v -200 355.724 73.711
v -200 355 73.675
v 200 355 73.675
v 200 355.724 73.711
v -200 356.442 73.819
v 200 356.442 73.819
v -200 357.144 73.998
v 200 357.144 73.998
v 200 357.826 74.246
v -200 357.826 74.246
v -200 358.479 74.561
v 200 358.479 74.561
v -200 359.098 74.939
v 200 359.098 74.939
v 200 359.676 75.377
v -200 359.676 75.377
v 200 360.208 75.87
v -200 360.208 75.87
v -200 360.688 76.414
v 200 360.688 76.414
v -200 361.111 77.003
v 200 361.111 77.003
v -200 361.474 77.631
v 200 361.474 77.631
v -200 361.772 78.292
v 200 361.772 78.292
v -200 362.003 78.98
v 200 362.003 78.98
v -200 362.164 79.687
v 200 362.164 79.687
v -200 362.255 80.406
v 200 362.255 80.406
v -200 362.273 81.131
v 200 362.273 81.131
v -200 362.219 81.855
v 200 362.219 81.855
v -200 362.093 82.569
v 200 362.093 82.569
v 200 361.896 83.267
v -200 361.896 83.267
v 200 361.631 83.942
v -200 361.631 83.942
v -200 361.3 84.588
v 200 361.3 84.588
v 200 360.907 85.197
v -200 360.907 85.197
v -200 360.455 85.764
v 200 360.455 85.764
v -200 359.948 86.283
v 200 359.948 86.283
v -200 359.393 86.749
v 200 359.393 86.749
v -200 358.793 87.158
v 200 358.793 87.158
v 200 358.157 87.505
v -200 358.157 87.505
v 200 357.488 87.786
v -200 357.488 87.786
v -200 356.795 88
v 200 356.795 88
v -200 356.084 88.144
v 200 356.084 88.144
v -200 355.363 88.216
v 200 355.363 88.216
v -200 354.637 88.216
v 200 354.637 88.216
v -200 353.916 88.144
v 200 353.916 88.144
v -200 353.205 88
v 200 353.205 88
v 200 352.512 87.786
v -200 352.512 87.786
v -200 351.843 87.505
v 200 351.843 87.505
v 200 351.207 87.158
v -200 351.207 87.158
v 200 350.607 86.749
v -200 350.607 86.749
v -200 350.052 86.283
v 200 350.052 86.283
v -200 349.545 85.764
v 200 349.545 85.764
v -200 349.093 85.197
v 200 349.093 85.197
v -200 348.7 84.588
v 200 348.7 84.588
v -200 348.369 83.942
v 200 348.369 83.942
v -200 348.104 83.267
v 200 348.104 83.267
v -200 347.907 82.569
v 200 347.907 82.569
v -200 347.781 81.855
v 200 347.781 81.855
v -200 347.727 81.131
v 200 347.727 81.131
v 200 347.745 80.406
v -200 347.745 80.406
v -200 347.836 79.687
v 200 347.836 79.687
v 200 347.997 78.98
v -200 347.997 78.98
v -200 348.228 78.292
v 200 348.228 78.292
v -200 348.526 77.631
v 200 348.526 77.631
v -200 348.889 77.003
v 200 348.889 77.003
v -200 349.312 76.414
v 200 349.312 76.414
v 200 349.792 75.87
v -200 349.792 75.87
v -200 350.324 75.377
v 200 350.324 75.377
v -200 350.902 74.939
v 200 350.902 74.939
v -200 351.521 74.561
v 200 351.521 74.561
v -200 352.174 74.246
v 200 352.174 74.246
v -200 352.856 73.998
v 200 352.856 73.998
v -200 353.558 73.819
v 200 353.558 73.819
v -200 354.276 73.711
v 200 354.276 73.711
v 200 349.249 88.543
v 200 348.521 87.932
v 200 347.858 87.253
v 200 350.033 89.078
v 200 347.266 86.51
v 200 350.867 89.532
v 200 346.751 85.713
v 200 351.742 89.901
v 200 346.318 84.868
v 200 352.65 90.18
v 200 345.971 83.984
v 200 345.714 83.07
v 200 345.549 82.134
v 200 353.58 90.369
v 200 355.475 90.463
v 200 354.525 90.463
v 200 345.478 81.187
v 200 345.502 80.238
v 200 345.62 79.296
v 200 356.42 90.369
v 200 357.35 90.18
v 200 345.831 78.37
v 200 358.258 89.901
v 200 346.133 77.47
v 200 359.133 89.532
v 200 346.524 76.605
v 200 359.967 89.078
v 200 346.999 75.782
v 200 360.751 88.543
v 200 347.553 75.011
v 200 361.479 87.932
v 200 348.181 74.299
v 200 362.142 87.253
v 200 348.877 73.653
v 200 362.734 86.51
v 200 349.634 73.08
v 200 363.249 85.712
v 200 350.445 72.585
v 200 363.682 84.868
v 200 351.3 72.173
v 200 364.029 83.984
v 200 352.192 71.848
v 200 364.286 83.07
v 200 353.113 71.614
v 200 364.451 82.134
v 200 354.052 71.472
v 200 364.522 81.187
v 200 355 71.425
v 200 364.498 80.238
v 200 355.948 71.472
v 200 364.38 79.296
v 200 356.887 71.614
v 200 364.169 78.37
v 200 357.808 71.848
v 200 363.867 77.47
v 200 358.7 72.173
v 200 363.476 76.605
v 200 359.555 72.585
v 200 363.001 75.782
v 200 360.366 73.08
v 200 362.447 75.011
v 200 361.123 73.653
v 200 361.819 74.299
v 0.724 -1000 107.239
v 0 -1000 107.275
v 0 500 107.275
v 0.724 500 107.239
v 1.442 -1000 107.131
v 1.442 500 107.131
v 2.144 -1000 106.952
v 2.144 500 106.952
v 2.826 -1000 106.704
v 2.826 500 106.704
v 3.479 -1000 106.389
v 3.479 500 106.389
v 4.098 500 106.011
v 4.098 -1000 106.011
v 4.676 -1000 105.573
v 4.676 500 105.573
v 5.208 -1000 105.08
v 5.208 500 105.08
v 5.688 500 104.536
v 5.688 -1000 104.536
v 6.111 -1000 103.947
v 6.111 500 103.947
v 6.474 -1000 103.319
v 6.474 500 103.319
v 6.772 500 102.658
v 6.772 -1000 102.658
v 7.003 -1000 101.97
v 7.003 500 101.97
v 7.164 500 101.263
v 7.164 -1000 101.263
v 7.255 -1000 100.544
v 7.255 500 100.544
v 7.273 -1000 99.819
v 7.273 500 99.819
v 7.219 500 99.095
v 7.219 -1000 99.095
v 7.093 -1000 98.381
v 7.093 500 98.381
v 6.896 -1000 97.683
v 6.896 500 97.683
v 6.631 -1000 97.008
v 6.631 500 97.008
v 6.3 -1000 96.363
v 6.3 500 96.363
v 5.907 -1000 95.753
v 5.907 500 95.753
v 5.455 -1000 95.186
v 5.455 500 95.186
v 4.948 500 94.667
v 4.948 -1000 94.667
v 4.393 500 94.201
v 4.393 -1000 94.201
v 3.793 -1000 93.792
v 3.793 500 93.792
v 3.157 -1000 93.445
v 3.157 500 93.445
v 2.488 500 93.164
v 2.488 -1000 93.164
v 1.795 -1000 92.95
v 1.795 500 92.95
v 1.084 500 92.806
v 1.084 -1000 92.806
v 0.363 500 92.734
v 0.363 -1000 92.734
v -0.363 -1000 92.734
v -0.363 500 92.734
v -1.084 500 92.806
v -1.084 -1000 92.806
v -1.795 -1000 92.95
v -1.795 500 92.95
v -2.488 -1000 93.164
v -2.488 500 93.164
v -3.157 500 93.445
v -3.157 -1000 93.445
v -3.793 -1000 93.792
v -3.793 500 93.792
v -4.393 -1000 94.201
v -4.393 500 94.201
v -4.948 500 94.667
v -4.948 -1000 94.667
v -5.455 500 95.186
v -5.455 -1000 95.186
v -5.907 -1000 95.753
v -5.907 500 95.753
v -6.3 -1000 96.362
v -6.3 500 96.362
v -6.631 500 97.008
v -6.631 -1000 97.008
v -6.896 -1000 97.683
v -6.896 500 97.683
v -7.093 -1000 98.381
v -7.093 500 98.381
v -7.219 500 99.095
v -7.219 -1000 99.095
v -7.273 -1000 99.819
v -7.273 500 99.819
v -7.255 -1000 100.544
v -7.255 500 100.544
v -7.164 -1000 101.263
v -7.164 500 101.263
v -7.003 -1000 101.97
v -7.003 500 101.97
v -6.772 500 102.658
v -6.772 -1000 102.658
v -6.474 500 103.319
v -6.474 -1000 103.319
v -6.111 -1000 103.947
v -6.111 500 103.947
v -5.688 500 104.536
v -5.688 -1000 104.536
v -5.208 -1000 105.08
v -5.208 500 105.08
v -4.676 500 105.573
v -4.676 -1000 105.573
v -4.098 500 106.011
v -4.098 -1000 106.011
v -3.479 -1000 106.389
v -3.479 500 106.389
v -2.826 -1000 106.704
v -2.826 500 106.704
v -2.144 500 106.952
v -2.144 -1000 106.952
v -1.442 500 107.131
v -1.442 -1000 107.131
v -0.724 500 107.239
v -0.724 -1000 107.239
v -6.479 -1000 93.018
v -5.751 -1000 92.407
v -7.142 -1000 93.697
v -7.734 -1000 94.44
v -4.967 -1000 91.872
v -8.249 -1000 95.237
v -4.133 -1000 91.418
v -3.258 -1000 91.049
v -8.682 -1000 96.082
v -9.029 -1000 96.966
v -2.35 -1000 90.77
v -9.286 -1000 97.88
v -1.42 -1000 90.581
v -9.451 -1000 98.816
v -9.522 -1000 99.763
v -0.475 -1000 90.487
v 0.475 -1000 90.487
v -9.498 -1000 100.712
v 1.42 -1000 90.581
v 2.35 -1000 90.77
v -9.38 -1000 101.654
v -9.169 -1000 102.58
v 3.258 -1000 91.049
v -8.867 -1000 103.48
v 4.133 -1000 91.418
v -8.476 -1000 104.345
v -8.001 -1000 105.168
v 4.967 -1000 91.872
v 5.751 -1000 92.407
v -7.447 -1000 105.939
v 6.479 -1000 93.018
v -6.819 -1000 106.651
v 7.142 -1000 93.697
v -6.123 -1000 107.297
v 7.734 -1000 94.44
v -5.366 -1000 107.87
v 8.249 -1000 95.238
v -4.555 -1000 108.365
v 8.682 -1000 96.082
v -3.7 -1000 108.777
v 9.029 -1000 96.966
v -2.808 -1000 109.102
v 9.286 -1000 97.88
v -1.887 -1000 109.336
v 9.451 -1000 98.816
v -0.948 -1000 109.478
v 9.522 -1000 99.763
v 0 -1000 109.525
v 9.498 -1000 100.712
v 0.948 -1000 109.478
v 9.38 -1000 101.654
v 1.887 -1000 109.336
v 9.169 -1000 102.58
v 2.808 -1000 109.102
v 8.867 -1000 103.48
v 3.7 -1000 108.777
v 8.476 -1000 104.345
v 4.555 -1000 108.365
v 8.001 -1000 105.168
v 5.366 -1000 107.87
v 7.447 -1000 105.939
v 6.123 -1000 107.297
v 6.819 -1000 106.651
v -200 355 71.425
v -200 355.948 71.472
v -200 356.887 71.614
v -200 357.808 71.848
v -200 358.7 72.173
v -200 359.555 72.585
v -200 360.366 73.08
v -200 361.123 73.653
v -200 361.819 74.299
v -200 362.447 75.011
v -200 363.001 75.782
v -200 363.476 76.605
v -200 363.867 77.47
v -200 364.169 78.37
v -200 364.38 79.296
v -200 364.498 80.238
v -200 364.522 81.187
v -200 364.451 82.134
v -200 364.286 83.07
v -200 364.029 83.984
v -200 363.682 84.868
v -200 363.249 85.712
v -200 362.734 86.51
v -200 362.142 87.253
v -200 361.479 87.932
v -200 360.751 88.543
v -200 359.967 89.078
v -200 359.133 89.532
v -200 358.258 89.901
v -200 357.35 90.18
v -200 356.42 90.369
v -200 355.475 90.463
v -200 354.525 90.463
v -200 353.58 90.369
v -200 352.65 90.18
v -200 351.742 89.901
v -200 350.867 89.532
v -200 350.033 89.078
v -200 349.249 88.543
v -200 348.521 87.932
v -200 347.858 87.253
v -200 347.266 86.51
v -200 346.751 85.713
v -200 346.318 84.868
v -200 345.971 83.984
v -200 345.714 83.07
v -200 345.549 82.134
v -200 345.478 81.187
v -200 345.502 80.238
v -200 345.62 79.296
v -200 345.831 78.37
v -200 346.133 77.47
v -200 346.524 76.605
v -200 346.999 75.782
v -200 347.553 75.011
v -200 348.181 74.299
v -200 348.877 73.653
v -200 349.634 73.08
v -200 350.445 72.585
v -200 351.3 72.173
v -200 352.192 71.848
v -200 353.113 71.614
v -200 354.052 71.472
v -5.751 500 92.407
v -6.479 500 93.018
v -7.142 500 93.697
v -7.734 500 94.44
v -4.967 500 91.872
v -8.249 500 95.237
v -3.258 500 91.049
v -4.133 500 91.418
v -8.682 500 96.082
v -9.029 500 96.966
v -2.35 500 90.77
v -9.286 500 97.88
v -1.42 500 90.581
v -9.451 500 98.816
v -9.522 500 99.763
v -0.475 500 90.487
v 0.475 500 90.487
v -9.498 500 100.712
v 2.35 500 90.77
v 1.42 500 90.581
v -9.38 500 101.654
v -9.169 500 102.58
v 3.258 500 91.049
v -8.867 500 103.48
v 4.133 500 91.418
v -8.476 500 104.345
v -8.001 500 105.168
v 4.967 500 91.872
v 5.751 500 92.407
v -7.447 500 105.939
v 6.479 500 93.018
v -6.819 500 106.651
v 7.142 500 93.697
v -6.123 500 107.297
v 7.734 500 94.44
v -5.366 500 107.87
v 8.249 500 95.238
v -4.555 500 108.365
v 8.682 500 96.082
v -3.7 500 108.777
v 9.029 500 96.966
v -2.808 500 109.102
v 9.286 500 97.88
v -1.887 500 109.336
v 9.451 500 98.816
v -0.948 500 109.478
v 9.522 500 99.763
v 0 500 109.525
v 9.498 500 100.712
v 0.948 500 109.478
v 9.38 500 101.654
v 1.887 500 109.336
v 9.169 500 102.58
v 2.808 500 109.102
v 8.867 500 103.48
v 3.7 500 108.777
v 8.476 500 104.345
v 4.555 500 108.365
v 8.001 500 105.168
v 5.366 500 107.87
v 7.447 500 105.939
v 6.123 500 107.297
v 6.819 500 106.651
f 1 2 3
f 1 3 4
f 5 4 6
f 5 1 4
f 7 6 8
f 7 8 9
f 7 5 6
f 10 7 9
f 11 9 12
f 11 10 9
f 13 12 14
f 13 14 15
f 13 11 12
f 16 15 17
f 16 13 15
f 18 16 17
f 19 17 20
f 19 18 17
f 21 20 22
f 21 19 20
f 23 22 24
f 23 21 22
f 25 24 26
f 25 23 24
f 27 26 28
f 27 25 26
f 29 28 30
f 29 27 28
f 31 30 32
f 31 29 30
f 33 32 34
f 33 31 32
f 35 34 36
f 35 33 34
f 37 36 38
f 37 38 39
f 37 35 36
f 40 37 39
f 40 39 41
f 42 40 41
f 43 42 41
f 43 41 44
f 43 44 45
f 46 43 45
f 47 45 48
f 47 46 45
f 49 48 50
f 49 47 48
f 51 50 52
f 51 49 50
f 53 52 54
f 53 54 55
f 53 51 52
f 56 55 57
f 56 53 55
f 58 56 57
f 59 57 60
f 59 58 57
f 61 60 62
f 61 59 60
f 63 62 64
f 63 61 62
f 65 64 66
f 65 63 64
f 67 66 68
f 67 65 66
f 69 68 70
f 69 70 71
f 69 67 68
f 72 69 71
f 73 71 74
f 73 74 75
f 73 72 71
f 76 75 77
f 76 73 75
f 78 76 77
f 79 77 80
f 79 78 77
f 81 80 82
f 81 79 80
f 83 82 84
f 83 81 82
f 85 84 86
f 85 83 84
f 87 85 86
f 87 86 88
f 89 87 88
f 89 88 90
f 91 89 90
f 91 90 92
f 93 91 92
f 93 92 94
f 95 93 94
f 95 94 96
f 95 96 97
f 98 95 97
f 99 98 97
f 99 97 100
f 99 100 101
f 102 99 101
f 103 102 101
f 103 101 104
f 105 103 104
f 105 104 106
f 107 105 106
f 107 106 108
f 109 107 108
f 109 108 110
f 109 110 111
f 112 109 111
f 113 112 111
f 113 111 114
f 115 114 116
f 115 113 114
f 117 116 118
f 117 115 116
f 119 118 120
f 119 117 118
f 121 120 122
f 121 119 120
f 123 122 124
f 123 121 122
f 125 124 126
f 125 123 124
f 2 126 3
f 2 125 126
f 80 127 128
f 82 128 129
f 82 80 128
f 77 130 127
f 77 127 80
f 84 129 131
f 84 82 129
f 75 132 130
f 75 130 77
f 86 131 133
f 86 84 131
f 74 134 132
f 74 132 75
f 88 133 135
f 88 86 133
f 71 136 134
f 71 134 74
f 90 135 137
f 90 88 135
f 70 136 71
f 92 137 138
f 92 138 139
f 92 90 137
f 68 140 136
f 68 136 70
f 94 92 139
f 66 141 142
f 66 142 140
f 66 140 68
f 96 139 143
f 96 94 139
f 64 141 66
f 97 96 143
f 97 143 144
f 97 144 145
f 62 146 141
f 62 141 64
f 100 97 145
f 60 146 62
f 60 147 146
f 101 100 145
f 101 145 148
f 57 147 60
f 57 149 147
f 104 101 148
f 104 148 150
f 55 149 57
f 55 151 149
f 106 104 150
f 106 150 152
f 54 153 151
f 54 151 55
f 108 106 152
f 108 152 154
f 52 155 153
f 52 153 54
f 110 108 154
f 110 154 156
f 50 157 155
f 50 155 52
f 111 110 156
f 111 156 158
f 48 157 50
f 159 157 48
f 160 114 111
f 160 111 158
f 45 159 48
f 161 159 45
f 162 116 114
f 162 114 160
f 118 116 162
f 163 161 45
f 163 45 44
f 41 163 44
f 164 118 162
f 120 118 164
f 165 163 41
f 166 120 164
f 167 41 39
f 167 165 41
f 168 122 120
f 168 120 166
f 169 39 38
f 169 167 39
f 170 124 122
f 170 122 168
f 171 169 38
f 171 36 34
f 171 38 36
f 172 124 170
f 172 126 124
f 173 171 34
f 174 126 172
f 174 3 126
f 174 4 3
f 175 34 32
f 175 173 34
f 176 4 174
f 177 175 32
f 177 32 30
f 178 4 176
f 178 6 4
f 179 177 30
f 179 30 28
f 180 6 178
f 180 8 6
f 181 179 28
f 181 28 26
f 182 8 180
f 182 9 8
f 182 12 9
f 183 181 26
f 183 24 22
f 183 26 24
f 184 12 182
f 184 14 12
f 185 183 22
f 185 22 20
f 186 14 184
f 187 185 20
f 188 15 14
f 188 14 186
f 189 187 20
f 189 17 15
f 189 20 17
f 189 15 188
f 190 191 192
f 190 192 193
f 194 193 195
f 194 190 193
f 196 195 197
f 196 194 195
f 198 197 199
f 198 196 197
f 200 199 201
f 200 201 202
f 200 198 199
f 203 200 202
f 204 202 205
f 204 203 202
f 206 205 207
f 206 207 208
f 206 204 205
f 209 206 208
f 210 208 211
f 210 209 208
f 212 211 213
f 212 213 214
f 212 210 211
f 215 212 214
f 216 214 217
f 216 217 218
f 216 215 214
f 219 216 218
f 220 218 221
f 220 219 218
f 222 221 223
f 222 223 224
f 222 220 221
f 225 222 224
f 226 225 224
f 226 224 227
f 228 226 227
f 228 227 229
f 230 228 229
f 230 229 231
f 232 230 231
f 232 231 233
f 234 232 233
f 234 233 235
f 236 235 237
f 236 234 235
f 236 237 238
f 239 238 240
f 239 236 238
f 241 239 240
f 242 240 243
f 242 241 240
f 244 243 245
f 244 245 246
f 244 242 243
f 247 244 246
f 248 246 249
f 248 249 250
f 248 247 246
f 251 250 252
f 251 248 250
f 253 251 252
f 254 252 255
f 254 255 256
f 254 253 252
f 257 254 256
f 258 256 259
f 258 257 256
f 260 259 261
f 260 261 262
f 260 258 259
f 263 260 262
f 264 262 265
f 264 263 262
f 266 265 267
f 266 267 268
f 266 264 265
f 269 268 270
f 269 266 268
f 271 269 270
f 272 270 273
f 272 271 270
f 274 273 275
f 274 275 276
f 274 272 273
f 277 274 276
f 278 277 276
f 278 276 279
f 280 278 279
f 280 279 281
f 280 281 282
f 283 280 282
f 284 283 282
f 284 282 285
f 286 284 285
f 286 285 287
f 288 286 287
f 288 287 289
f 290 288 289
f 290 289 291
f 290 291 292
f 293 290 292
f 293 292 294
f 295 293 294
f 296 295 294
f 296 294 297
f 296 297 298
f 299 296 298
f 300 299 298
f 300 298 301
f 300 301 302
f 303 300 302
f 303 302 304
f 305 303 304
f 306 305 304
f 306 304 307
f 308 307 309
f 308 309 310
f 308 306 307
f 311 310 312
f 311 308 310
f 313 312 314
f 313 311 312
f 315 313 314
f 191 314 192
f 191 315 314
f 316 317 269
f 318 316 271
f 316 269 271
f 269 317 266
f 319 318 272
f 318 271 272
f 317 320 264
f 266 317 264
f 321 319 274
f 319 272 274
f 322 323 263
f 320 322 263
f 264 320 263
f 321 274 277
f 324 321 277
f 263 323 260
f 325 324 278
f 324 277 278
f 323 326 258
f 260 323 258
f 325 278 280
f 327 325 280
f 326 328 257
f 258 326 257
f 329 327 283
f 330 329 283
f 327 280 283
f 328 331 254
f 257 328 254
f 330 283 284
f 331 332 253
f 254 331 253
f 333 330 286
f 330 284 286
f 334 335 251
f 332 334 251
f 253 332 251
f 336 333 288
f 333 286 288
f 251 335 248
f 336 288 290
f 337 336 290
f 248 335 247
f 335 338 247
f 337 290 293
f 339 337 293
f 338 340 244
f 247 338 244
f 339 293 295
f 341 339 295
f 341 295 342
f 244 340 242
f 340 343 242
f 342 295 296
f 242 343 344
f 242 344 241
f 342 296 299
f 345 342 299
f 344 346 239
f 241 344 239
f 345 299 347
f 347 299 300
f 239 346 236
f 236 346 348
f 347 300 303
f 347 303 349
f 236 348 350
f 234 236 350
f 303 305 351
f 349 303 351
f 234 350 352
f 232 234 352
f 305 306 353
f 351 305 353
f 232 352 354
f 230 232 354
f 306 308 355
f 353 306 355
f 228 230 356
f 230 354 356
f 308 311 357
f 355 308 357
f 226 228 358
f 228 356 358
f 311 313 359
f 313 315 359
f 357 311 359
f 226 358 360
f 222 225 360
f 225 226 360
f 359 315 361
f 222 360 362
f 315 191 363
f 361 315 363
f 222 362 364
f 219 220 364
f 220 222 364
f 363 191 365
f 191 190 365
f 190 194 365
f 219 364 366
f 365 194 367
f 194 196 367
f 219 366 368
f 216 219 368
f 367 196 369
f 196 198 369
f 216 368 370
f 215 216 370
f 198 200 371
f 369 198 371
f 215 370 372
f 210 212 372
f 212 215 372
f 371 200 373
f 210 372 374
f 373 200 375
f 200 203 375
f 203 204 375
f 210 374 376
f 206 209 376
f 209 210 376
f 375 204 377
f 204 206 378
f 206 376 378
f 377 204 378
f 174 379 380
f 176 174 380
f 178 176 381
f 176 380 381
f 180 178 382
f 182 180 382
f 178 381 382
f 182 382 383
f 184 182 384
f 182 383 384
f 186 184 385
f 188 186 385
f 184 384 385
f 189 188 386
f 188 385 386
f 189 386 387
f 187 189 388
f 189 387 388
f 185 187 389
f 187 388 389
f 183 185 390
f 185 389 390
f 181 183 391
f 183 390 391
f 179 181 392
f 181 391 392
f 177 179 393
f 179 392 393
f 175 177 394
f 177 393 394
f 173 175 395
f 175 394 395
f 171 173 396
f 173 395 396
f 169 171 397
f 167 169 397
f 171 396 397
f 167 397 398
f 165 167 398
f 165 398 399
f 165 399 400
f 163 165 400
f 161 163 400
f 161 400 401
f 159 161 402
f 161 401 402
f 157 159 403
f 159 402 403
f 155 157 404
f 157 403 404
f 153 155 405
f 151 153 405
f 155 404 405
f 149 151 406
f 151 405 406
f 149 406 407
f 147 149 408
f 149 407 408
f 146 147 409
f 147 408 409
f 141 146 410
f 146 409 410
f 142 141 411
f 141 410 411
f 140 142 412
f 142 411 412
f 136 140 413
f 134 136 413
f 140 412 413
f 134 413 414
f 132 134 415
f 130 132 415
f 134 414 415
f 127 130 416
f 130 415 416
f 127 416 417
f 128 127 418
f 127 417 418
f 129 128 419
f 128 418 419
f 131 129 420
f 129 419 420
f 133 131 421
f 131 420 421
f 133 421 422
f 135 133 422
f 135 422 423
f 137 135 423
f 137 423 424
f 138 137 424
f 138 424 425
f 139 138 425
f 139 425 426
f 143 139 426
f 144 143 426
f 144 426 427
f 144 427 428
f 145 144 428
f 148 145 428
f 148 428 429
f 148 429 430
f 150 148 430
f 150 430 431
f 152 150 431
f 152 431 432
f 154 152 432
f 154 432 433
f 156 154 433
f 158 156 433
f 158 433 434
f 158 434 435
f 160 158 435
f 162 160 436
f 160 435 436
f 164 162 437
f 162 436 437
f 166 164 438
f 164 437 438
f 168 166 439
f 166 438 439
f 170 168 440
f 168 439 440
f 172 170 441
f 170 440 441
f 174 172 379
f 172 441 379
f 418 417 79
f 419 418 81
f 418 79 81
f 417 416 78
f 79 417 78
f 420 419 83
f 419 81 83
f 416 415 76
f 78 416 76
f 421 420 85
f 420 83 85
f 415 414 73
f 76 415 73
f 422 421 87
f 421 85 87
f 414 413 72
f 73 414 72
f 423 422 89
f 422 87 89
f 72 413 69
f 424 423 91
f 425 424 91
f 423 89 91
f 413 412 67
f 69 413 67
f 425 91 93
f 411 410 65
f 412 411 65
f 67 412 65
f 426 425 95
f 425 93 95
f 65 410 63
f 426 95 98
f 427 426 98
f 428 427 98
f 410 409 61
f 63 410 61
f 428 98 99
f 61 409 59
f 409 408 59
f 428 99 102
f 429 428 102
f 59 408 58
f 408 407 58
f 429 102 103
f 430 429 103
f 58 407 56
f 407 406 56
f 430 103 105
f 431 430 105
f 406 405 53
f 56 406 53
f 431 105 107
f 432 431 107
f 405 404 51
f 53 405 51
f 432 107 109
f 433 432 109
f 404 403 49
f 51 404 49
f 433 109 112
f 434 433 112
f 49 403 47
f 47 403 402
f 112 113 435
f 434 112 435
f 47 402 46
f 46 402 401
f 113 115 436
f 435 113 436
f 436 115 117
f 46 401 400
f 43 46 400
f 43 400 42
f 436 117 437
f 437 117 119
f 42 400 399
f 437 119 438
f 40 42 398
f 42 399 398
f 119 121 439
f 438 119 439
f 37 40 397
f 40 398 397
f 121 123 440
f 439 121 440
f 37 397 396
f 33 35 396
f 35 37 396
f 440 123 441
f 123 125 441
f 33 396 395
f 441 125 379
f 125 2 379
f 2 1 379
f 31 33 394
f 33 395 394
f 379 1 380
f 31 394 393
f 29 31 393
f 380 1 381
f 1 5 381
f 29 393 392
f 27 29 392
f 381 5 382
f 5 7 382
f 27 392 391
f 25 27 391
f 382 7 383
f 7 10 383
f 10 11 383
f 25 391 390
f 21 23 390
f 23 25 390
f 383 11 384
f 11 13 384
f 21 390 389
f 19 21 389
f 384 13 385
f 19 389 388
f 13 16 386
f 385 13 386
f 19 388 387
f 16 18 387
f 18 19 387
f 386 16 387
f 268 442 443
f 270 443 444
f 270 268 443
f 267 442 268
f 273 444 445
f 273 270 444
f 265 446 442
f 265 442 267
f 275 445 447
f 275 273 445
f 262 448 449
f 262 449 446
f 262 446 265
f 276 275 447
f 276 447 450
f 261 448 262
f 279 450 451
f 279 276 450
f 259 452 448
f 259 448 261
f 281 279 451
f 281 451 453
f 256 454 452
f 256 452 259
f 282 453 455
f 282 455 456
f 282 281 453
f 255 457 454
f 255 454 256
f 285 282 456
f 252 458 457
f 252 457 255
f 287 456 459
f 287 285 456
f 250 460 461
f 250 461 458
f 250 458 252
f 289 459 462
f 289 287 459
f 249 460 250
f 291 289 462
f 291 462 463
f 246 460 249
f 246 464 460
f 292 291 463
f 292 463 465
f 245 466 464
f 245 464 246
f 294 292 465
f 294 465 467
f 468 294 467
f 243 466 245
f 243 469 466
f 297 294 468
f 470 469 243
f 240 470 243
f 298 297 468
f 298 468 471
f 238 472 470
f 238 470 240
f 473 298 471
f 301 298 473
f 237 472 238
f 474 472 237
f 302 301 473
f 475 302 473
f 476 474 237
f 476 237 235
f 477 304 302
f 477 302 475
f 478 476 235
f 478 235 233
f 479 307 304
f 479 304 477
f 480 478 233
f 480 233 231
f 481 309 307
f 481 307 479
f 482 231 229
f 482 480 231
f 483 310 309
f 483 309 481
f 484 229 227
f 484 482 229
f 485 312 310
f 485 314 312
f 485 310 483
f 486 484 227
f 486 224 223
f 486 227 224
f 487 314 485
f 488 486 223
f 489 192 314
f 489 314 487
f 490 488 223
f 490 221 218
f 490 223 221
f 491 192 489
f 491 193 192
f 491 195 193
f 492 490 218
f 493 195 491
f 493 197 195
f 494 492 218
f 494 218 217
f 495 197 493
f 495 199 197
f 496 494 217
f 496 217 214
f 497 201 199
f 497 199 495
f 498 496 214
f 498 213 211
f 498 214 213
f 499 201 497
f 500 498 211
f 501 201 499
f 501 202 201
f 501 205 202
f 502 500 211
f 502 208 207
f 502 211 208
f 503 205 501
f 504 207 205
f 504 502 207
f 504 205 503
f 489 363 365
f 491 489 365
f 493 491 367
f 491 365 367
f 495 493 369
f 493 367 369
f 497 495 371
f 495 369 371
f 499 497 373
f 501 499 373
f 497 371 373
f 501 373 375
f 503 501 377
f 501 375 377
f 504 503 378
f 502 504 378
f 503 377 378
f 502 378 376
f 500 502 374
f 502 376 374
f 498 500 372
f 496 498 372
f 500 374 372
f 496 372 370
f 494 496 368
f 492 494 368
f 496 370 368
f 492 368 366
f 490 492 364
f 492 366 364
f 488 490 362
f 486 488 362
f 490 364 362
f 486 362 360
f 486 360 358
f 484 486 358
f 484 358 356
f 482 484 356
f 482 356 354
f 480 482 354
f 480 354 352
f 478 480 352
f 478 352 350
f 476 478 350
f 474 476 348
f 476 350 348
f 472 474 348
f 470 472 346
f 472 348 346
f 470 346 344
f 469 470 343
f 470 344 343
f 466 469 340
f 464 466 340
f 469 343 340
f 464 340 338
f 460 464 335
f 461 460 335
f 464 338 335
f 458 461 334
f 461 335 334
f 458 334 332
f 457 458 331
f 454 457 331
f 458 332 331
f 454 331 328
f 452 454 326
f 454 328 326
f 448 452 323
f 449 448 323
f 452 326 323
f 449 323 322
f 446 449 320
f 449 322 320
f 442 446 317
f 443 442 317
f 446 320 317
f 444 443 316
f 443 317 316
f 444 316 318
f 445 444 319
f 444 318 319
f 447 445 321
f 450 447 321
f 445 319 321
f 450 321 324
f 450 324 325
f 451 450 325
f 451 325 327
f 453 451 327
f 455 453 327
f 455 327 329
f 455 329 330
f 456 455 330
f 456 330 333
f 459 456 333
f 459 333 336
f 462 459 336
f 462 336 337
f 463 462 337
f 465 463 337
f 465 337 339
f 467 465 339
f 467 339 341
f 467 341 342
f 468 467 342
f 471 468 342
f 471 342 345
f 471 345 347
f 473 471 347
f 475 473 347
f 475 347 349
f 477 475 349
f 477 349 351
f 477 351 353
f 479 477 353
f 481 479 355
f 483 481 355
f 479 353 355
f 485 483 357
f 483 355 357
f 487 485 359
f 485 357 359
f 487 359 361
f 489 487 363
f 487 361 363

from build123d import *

# Parameters (mm, degrees)
RESSALTO_EXTRUS_O1_DEPTH      = 500
RESSALTO_EXTRUS_O1_DEPTH_BACK = 1000
ESBO_O1_R                     = 9.525
ESBO_O1_R_2                   = 7.275
RESSALTO_EXTRUS_O2_DEPTH      = 200
RESSALTO_EXTRUS_O2_DEPTH_BACK = 200
ESBO_O3_R                     = 9.525
ESBO_O3_R_2                   = 7.275


with BuildPart() as part:
    # Esboço1 → Ressalto-extrusão1 (new, two sides: drawn at the far end of the back side and taken through both)
    with BuildSketch(Plane(origin=(0, 0, 0), x_dir=(1, 0, 0), z_dir=(0, 1, 0)).offset(-RESSALTO_EXTRUS_O1_DEPTH_BACK)):
        with Locations((0, -100)):
            Circle(ESBO_O1_R)
        with Locations((0, -100)):
            Circle(ESBO_O1_R_2, mode=Mode.SUBTRACT)
    extrude(amount=RESSALTO_EXTRUS_O1_DEPTH + RESSALTO_EXTRUS_O1_DEPTH_BACK)


with BuildPart() as body_2:
    # Esboço3 → Ressalto-extrusão2 (new, two sides: drawn at the far end of the back side and taken through both)
    with BuildSketch(Plane(origin=(0, 0, 0), x_dir=(0, 0, -1), z_dir=(1, 0, 0)).offset(-RESSALTO_EXTRUS_O2_DEPTH_BACK)):
        with Locations((-80.95, 355)):
            Circle(ESBO_O3_R)
        with Locations((-80.95, 355)):
            Circle(ESBO_O3_R_2, mode=Mode.SUBTRACT)
    extrude(amount=RESSALTO_EXTRUS_O2_DEPTH + RESSALTO_EXTRUS_O2_DEPTH_BACK)


solid = Compound([part.part, body_2.part])
